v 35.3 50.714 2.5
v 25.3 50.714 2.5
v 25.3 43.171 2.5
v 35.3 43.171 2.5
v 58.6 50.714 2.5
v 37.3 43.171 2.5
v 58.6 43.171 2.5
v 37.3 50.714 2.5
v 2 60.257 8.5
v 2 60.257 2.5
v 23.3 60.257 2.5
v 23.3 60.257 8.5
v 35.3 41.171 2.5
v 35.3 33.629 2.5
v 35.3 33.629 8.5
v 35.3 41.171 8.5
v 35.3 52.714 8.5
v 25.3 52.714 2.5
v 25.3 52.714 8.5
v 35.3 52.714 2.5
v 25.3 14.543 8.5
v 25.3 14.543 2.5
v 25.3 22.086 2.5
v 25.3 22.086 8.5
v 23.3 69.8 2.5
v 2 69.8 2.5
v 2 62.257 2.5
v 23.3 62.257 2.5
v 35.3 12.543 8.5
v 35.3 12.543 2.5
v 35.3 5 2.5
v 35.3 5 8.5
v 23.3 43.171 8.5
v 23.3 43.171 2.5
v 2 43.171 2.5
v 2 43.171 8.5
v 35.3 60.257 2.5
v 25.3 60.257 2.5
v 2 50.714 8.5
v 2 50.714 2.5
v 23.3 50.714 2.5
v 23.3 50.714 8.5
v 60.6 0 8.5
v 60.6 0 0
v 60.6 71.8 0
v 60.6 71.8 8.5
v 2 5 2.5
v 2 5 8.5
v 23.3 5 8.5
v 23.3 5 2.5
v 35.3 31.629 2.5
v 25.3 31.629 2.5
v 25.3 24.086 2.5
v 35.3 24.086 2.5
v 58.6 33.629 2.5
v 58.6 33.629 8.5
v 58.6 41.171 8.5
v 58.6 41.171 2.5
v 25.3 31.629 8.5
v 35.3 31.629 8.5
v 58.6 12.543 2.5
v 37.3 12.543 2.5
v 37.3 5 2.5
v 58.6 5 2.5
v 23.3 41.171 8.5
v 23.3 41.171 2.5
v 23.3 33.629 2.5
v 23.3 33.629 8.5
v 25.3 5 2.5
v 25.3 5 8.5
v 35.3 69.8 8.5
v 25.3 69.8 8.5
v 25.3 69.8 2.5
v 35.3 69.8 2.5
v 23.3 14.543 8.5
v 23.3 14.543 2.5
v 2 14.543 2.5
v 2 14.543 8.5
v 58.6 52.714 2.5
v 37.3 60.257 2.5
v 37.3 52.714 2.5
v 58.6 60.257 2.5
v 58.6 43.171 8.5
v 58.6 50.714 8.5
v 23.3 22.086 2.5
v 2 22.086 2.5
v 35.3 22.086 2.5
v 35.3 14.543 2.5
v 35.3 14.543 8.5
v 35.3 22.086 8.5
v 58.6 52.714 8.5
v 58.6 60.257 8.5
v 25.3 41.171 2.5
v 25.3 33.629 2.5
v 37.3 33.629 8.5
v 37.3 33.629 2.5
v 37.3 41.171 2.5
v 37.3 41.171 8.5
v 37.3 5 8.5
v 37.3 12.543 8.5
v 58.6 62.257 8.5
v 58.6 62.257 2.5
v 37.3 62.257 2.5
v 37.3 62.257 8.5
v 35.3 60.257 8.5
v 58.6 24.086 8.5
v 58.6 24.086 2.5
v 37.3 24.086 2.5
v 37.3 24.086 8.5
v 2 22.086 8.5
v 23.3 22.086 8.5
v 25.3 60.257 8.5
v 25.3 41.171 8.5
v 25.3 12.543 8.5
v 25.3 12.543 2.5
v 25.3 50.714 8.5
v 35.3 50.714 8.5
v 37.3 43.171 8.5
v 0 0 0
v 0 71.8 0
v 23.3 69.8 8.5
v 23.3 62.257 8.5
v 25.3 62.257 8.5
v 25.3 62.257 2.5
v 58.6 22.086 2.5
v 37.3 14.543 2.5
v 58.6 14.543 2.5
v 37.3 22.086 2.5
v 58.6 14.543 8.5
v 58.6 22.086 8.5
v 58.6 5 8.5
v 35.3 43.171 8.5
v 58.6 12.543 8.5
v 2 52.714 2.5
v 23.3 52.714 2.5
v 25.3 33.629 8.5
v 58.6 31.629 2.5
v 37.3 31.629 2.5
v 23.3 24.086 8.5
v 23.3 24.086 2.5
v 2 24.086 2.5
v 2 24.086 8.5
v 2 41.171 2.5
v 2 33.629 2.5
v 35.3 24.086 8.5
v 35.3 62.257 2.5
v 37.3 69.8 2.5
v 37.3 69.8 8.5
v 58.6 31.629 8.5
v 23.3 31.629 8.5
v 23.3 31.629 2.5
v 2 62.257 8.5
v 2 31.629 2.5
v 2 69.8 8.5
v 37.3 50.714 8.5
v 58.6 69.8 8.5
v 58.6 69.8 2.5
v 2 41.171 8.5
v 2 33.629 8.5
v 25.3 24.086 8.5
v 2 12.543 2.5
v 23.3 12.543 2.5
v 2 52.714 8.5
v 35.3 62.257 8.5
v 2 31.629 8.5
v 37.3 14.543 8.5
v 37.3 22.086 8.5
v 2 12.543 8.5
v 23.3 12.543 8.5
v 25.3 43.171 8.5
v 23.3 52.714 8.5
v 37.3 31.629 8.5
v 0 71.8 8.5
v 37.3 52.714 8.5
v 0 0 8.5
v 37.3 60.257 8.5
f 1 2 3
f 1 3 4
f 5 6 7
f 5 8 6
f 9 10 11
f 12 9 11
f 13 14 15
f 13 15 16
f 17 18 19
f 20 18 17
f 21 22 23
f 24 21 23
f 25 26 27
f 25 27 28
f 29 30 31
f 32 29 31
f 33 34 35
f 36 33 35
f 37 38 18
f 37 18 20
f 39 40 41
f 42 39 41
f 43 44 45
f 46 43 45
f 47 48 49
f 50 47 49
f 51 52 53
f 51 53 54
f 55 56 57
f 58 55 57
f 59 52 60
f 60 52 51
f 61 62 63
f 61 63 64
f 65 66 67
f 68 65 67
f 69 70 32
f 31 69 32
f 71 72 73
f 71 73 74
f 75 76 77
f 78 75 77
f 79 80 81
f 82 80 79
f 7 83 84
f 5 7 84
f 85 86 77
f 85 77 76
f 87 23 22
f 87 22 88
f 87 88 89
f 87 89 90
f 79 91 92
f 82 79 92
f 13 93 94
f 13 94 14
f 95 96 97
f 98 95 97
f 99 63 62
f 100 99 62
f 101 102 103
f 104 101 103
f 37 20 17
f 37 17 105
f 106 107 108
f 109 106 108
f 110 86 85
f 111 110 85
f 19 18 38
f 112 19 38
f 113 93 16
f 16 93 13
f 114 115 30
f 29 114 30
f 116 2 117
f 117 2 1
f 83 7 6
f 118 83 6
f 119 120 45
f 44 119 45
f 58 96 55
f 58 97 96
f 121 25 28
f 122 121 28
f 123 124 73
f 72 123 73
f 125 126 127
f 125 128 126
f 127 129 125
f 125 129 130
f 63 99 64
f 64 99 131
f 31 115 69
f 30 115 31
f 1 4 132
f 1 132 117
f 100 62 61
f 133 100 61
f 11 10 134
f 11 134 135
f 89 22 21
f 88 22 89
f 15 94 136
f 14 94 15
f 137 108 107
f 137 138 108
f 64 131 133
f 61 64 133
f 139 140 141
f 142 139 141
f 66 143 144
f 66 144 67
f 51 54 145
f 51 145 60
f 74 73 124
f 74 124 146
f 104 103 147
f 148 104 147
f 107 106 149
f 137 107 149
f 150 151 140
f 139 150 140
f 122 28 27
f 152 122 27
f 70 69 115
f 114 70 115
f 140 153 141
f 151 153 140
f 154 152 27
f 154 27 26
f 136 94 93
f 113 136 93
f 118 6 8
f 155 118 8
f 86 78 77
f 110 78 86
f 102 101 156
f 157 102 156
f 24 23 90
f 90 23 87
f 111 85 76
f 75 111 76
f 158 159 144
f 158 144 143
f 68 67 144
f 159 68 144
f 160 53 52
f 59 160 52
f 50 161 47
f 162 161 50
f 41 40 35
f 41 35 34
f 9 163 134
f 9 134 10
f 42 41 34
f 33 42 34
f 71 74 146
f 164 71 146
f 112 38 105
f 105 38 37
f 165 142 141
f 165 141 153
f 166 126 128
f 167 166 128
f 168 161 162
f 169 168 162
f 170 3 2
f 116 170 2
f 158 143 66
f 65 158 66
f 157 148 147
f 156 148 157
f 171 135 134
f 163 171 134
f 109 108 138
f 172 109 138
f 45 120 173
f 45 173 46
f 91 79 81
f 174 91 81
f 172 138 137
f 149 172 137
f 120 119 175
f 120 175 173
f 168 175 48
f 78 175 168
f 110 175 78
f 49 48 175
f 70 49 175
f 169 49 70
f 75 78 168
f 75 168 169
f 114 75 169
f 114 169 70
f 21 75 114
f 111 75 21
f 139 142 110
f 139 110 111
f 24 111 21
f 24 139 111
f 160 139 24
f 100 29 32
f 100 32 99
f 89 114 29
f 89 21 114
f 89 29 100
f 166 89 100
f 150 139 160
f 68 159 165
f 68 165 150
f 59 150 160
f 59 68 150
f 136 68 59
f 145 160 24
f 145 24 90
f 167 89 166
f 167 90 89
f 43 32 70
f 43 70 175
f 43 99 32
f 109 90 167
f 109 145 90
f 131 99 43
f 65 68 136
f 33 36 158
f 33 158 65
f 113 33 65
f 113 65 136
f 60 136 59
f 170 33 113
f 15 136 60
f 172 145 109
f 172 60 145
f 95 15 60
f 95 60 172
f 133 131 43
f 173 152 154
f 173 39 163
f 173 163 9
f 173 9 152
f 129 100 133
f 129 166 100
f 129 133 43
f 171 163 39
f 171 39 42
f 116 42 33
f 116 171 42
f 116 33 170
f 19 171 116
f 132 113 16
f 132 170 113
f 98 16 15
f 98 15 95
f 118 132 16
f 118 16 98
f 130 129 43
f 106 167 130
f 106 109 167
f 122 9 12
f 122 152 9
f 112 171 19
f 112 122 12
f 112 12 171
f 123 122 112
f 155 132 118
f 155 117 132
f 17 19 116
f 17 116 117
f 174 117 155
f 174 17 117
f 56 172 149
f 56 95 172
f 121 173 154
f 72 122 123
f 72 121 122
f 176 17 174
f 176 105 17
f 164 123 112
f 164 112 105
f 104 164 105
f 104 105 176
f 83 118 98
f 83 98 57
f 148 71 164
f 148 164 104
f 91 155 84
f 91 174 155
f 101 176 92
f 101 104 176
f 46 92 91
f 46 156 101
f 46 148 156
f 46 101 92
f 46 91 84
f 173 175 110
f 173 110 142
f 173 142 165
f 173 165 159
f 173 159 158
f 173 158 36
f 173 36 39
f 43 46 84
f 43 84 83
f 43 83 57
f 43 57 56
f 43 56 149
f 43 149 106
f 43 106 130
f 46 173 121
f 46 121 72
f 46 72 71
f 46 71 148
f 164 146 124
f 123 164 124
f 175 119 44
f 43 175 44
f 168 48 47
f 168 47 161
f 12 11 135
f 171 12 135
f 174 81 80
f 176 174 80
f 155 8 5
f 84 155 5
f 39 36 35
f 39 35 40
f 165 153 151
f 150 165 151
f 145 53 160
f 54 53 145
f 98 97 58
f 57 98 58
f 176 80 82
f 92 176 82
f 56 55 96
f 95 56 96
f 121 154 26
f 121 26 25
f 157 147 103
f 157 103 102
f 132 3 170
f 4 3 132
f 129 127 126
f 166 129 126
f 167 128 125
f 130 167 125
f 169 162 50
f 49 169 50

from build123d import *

# Parameters (mm, degrees)
F0_W     = 60.6
F0_H     = 71.8
F1_DEPTH = 8.5
F2_W     = 56.6
F2_H     = 64.7999969125
F3_DEPTH = 6
F4_W     = 10
F4_H     = 7.5428567018
F5_DEPTH = 6


with BuildPart() as f1:
    # F0 (on Top) → F1 (new body)
    with BuildSketch(Plane.XY):
        with Locations((30.3, 35.9)):
            Rectangle(F0_W, F0_H)
    extrude(amount=F1_DEPTH)

    # F2 (on face) → F3 (cut)
    with BuildSketch(Plane.XY.offset(8.5)):
        with Locations((30.3, 37.3999984562)):
            Rectangle(F2_W, F2_H)
    extrude(amount=-F3_DEPTH, mode=Mode.SUBTRACT)

    # F4 (on face) → F5 (join)
    with BuildSketch(Plane.XY.offset(2.5)):
        Polygon((25.3, 69.7999969125), (23.3, 69.7999969125), (23.3, 62.2571402107), (2, 62.2571402107), (2, 60.2571402107), (23.3, 60.2571402107), (23.3, 52.7142835089), (2, 52.7142835089), (2, 50.7142835089), (23.3, 50.7142835089), (23.3, 43.1714268071), (2, 43.1714268071), (2, 41.1714268071), (23.3, 41.1714268071), (23.3, 33.6285701053), (2, 33.6285701053), (2, 31.6285701053), (23.3, 31.6285701053), (23.3, 24.0857134036), (2, 24.0857134036), (2, 22.0857134036), (23.3, 22.0857134036), (23.3, 14.5428567018), (2, 14.5428567018), (2, 12.5428567018), (23.3, 12.5428567018), (23.3, 5), (25.3, 5), (25.3, 12.5428567018), (35.3, 12.5428567018), (35.3, 5), (37.3, 5), (37.3, 12.5428567018), (58.6, 12.5428567018), (58.6, 14.5428567018), (37.3, 14.5428567018), (37.3, 22.0857134036), (58.6, 22.0857134036), (58.6, 24.0857134036), (37.3, 24.0857134036), (37.3, 31.6285701053), (58.6, 31.6285701053), (58.6, 33.6285701053), (37.3, 33.6285701053), (37.3, 41.1714268071), (58.6, 41.1714268071), (58.6, 43.1714268071), (37.3, 43.1714268071), (37.3, 50.7142835089), (58.6, 50.7142835089), (58.6, 52.7142835089), (37.3, 52.7142835089), (37.3, 60.2571402107), (58.6, 60.2571402107), (58.6, 62.2571402107), (37.3, 62.2571402107), (37.3, 69.7999969125), (35.3, 69.7999969125), (35.3, 62.2571402107), (25.3, 62.2571402107), align=None)
        with Locations((30.3, 18.3142850527)):
            Rectangle(F4_W, F4_H, mode=Mode.SUBTRACT)
        with Locations((30.3, 27.8571417545)):
            Rectangle(F4_W, F4_H, mode=Mode.SUBTRACT)
        with Locations((30.3, 37.3999984562)):
            Rectangle(F4_W, F4_H, mode=Mode.SUBTRACT)
        with Locations((30.3, 46.942855158)):
            Rectangle(F4_W, F4_H, mode=Mode.SUBTRACT)
        with Locations((30.3, 56.4857118598)):
            Rectangle(F4_W, F4_H, mode=Mode.SUBTRACT)
    extrude(amount=F5_DEPTH)


with BuildPart() as f6_1:
    # F6: copy of F1
    add(f1.part)


solid = f1.part
